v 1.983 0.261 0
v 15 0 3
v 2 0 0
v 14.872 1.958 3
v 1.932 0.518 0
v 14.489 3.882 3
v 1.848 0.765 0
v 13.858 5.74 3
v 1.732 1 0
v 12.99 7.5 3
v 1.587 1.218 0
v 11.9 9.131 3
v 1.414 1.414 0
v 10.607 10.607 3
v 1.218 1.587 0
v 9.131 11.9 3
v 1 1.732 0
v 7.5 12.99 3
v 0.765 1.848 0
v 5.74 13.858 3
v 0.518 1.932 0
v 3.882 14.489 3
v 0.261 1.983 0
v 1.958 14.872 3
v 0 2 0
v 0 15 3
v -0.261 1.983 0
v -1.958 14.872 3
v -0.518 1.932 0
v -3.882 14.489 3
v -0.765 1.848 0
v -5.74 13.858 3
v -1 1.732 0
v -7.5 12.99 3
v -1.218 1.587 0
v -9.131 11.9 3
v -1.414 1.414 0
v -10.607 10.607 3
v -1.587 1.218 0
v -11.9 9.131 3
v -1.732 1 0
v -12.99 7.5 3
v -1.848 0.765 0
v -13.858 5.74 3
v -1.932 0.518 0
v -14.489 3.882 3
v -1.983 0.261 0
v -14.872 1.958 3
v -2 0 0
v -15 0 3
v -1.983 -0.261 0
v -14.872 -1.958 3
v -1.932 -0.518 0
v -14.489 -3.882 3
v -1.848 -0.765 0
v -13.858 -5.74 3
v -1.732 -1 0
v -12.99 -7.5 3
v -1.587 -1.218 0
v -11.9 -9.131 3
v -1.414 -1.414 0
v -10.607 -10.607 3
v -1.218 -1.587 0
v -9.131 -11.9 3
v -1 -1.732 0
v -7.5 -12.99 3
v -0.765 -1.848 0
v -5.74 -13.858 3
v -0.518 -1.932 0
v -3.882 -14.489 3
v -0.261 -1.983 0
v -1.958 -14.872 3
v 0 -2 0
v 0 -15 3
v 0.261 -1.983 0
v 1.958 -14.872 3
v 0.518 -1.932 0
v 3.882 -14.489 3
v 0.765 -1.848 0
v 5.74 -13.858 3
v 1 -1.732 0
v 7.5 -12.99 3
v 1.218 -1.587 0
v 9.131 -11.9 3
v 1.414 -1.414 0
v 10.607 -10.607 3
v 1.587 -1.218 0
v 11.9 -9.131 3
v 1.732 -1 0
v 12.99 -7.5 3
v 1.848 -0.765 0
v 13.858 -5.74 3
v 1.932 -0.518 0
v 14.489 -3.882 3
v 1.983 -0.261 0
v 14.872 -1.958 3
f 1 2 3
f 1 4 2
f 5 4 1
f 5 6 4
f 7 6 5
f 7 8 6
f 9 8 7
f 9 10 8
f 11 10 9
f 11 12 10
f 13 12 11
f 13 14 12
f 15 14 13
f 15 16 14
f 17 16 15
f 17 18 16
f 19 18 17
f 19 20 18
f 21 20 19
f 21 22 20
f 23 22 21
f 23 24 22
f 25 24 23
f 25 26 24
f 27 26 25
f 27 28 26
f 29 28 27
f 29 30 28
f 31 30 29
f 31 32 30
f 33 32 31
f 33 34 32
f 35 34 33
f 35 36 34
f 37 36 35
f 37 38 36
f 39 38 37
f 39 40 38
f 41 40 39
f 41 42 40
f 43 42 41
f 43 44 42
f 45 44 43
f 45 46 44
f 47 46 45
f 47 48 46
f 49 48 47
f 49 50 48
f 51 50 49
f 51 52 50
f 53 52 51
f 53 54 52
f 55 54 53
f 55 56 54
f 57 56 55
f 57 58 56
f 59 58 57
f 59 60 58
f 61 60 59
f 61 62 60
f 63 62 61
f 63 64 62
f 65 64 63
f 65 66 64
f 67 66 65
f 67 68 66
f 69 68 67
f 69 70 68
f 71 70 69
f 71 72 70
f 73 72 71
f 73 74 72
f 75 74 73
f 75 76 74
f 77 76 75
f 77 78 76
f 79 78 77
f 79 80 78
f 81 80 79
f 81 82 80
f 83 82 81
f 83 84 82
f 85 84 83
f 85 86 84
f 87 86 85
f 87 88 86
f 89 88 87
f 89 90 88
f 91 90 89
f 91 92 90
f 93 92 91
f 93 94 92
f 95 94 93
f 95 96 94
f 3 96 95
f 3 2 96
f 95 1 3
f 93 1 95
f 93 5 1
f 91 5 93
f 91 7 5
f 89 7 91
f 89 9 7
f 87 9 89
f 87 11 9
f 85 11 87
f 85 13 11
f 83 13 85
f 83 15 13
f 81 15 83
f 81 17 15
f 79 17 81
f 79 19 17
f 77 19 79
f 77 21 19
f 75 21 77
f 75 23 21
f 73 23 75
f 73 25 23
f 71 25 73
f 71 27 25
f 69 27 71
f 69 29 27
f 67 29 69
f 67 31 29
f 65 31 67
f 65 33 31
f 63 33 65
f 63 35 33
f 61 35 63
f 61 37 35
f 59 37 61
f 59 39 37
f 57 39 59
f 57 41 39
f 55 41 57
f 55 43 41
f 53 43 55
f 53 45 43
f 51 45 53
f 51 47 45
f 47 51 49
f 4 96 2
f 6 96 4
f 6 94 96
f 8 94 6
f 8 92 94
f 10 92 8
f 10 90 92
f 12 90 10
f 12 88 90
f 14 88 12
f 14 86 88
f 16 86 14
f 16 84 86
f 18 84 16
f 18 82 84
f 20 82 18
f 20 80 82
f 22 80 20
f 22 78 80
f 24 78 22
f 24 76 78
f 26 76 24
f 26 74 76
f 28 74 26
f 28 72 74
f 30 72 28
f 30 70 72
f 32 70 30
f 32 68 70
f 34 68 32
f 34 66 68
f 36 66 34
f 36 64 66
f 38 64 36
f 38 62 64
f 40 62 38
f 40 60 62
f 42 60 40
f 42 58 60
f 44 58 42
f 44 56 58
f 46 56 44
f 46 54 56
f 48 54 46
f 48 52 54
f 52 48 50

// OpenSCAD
// A steep taper (~77 deg from vertical -- dr/dz = 13/3) that genuinely
// needs support material at the default 45 deg threshold.
$fa = 6; $fs = 0.5;
cylinder(h = 3, r1 = 2, r2 = 15, $fn = 48);
